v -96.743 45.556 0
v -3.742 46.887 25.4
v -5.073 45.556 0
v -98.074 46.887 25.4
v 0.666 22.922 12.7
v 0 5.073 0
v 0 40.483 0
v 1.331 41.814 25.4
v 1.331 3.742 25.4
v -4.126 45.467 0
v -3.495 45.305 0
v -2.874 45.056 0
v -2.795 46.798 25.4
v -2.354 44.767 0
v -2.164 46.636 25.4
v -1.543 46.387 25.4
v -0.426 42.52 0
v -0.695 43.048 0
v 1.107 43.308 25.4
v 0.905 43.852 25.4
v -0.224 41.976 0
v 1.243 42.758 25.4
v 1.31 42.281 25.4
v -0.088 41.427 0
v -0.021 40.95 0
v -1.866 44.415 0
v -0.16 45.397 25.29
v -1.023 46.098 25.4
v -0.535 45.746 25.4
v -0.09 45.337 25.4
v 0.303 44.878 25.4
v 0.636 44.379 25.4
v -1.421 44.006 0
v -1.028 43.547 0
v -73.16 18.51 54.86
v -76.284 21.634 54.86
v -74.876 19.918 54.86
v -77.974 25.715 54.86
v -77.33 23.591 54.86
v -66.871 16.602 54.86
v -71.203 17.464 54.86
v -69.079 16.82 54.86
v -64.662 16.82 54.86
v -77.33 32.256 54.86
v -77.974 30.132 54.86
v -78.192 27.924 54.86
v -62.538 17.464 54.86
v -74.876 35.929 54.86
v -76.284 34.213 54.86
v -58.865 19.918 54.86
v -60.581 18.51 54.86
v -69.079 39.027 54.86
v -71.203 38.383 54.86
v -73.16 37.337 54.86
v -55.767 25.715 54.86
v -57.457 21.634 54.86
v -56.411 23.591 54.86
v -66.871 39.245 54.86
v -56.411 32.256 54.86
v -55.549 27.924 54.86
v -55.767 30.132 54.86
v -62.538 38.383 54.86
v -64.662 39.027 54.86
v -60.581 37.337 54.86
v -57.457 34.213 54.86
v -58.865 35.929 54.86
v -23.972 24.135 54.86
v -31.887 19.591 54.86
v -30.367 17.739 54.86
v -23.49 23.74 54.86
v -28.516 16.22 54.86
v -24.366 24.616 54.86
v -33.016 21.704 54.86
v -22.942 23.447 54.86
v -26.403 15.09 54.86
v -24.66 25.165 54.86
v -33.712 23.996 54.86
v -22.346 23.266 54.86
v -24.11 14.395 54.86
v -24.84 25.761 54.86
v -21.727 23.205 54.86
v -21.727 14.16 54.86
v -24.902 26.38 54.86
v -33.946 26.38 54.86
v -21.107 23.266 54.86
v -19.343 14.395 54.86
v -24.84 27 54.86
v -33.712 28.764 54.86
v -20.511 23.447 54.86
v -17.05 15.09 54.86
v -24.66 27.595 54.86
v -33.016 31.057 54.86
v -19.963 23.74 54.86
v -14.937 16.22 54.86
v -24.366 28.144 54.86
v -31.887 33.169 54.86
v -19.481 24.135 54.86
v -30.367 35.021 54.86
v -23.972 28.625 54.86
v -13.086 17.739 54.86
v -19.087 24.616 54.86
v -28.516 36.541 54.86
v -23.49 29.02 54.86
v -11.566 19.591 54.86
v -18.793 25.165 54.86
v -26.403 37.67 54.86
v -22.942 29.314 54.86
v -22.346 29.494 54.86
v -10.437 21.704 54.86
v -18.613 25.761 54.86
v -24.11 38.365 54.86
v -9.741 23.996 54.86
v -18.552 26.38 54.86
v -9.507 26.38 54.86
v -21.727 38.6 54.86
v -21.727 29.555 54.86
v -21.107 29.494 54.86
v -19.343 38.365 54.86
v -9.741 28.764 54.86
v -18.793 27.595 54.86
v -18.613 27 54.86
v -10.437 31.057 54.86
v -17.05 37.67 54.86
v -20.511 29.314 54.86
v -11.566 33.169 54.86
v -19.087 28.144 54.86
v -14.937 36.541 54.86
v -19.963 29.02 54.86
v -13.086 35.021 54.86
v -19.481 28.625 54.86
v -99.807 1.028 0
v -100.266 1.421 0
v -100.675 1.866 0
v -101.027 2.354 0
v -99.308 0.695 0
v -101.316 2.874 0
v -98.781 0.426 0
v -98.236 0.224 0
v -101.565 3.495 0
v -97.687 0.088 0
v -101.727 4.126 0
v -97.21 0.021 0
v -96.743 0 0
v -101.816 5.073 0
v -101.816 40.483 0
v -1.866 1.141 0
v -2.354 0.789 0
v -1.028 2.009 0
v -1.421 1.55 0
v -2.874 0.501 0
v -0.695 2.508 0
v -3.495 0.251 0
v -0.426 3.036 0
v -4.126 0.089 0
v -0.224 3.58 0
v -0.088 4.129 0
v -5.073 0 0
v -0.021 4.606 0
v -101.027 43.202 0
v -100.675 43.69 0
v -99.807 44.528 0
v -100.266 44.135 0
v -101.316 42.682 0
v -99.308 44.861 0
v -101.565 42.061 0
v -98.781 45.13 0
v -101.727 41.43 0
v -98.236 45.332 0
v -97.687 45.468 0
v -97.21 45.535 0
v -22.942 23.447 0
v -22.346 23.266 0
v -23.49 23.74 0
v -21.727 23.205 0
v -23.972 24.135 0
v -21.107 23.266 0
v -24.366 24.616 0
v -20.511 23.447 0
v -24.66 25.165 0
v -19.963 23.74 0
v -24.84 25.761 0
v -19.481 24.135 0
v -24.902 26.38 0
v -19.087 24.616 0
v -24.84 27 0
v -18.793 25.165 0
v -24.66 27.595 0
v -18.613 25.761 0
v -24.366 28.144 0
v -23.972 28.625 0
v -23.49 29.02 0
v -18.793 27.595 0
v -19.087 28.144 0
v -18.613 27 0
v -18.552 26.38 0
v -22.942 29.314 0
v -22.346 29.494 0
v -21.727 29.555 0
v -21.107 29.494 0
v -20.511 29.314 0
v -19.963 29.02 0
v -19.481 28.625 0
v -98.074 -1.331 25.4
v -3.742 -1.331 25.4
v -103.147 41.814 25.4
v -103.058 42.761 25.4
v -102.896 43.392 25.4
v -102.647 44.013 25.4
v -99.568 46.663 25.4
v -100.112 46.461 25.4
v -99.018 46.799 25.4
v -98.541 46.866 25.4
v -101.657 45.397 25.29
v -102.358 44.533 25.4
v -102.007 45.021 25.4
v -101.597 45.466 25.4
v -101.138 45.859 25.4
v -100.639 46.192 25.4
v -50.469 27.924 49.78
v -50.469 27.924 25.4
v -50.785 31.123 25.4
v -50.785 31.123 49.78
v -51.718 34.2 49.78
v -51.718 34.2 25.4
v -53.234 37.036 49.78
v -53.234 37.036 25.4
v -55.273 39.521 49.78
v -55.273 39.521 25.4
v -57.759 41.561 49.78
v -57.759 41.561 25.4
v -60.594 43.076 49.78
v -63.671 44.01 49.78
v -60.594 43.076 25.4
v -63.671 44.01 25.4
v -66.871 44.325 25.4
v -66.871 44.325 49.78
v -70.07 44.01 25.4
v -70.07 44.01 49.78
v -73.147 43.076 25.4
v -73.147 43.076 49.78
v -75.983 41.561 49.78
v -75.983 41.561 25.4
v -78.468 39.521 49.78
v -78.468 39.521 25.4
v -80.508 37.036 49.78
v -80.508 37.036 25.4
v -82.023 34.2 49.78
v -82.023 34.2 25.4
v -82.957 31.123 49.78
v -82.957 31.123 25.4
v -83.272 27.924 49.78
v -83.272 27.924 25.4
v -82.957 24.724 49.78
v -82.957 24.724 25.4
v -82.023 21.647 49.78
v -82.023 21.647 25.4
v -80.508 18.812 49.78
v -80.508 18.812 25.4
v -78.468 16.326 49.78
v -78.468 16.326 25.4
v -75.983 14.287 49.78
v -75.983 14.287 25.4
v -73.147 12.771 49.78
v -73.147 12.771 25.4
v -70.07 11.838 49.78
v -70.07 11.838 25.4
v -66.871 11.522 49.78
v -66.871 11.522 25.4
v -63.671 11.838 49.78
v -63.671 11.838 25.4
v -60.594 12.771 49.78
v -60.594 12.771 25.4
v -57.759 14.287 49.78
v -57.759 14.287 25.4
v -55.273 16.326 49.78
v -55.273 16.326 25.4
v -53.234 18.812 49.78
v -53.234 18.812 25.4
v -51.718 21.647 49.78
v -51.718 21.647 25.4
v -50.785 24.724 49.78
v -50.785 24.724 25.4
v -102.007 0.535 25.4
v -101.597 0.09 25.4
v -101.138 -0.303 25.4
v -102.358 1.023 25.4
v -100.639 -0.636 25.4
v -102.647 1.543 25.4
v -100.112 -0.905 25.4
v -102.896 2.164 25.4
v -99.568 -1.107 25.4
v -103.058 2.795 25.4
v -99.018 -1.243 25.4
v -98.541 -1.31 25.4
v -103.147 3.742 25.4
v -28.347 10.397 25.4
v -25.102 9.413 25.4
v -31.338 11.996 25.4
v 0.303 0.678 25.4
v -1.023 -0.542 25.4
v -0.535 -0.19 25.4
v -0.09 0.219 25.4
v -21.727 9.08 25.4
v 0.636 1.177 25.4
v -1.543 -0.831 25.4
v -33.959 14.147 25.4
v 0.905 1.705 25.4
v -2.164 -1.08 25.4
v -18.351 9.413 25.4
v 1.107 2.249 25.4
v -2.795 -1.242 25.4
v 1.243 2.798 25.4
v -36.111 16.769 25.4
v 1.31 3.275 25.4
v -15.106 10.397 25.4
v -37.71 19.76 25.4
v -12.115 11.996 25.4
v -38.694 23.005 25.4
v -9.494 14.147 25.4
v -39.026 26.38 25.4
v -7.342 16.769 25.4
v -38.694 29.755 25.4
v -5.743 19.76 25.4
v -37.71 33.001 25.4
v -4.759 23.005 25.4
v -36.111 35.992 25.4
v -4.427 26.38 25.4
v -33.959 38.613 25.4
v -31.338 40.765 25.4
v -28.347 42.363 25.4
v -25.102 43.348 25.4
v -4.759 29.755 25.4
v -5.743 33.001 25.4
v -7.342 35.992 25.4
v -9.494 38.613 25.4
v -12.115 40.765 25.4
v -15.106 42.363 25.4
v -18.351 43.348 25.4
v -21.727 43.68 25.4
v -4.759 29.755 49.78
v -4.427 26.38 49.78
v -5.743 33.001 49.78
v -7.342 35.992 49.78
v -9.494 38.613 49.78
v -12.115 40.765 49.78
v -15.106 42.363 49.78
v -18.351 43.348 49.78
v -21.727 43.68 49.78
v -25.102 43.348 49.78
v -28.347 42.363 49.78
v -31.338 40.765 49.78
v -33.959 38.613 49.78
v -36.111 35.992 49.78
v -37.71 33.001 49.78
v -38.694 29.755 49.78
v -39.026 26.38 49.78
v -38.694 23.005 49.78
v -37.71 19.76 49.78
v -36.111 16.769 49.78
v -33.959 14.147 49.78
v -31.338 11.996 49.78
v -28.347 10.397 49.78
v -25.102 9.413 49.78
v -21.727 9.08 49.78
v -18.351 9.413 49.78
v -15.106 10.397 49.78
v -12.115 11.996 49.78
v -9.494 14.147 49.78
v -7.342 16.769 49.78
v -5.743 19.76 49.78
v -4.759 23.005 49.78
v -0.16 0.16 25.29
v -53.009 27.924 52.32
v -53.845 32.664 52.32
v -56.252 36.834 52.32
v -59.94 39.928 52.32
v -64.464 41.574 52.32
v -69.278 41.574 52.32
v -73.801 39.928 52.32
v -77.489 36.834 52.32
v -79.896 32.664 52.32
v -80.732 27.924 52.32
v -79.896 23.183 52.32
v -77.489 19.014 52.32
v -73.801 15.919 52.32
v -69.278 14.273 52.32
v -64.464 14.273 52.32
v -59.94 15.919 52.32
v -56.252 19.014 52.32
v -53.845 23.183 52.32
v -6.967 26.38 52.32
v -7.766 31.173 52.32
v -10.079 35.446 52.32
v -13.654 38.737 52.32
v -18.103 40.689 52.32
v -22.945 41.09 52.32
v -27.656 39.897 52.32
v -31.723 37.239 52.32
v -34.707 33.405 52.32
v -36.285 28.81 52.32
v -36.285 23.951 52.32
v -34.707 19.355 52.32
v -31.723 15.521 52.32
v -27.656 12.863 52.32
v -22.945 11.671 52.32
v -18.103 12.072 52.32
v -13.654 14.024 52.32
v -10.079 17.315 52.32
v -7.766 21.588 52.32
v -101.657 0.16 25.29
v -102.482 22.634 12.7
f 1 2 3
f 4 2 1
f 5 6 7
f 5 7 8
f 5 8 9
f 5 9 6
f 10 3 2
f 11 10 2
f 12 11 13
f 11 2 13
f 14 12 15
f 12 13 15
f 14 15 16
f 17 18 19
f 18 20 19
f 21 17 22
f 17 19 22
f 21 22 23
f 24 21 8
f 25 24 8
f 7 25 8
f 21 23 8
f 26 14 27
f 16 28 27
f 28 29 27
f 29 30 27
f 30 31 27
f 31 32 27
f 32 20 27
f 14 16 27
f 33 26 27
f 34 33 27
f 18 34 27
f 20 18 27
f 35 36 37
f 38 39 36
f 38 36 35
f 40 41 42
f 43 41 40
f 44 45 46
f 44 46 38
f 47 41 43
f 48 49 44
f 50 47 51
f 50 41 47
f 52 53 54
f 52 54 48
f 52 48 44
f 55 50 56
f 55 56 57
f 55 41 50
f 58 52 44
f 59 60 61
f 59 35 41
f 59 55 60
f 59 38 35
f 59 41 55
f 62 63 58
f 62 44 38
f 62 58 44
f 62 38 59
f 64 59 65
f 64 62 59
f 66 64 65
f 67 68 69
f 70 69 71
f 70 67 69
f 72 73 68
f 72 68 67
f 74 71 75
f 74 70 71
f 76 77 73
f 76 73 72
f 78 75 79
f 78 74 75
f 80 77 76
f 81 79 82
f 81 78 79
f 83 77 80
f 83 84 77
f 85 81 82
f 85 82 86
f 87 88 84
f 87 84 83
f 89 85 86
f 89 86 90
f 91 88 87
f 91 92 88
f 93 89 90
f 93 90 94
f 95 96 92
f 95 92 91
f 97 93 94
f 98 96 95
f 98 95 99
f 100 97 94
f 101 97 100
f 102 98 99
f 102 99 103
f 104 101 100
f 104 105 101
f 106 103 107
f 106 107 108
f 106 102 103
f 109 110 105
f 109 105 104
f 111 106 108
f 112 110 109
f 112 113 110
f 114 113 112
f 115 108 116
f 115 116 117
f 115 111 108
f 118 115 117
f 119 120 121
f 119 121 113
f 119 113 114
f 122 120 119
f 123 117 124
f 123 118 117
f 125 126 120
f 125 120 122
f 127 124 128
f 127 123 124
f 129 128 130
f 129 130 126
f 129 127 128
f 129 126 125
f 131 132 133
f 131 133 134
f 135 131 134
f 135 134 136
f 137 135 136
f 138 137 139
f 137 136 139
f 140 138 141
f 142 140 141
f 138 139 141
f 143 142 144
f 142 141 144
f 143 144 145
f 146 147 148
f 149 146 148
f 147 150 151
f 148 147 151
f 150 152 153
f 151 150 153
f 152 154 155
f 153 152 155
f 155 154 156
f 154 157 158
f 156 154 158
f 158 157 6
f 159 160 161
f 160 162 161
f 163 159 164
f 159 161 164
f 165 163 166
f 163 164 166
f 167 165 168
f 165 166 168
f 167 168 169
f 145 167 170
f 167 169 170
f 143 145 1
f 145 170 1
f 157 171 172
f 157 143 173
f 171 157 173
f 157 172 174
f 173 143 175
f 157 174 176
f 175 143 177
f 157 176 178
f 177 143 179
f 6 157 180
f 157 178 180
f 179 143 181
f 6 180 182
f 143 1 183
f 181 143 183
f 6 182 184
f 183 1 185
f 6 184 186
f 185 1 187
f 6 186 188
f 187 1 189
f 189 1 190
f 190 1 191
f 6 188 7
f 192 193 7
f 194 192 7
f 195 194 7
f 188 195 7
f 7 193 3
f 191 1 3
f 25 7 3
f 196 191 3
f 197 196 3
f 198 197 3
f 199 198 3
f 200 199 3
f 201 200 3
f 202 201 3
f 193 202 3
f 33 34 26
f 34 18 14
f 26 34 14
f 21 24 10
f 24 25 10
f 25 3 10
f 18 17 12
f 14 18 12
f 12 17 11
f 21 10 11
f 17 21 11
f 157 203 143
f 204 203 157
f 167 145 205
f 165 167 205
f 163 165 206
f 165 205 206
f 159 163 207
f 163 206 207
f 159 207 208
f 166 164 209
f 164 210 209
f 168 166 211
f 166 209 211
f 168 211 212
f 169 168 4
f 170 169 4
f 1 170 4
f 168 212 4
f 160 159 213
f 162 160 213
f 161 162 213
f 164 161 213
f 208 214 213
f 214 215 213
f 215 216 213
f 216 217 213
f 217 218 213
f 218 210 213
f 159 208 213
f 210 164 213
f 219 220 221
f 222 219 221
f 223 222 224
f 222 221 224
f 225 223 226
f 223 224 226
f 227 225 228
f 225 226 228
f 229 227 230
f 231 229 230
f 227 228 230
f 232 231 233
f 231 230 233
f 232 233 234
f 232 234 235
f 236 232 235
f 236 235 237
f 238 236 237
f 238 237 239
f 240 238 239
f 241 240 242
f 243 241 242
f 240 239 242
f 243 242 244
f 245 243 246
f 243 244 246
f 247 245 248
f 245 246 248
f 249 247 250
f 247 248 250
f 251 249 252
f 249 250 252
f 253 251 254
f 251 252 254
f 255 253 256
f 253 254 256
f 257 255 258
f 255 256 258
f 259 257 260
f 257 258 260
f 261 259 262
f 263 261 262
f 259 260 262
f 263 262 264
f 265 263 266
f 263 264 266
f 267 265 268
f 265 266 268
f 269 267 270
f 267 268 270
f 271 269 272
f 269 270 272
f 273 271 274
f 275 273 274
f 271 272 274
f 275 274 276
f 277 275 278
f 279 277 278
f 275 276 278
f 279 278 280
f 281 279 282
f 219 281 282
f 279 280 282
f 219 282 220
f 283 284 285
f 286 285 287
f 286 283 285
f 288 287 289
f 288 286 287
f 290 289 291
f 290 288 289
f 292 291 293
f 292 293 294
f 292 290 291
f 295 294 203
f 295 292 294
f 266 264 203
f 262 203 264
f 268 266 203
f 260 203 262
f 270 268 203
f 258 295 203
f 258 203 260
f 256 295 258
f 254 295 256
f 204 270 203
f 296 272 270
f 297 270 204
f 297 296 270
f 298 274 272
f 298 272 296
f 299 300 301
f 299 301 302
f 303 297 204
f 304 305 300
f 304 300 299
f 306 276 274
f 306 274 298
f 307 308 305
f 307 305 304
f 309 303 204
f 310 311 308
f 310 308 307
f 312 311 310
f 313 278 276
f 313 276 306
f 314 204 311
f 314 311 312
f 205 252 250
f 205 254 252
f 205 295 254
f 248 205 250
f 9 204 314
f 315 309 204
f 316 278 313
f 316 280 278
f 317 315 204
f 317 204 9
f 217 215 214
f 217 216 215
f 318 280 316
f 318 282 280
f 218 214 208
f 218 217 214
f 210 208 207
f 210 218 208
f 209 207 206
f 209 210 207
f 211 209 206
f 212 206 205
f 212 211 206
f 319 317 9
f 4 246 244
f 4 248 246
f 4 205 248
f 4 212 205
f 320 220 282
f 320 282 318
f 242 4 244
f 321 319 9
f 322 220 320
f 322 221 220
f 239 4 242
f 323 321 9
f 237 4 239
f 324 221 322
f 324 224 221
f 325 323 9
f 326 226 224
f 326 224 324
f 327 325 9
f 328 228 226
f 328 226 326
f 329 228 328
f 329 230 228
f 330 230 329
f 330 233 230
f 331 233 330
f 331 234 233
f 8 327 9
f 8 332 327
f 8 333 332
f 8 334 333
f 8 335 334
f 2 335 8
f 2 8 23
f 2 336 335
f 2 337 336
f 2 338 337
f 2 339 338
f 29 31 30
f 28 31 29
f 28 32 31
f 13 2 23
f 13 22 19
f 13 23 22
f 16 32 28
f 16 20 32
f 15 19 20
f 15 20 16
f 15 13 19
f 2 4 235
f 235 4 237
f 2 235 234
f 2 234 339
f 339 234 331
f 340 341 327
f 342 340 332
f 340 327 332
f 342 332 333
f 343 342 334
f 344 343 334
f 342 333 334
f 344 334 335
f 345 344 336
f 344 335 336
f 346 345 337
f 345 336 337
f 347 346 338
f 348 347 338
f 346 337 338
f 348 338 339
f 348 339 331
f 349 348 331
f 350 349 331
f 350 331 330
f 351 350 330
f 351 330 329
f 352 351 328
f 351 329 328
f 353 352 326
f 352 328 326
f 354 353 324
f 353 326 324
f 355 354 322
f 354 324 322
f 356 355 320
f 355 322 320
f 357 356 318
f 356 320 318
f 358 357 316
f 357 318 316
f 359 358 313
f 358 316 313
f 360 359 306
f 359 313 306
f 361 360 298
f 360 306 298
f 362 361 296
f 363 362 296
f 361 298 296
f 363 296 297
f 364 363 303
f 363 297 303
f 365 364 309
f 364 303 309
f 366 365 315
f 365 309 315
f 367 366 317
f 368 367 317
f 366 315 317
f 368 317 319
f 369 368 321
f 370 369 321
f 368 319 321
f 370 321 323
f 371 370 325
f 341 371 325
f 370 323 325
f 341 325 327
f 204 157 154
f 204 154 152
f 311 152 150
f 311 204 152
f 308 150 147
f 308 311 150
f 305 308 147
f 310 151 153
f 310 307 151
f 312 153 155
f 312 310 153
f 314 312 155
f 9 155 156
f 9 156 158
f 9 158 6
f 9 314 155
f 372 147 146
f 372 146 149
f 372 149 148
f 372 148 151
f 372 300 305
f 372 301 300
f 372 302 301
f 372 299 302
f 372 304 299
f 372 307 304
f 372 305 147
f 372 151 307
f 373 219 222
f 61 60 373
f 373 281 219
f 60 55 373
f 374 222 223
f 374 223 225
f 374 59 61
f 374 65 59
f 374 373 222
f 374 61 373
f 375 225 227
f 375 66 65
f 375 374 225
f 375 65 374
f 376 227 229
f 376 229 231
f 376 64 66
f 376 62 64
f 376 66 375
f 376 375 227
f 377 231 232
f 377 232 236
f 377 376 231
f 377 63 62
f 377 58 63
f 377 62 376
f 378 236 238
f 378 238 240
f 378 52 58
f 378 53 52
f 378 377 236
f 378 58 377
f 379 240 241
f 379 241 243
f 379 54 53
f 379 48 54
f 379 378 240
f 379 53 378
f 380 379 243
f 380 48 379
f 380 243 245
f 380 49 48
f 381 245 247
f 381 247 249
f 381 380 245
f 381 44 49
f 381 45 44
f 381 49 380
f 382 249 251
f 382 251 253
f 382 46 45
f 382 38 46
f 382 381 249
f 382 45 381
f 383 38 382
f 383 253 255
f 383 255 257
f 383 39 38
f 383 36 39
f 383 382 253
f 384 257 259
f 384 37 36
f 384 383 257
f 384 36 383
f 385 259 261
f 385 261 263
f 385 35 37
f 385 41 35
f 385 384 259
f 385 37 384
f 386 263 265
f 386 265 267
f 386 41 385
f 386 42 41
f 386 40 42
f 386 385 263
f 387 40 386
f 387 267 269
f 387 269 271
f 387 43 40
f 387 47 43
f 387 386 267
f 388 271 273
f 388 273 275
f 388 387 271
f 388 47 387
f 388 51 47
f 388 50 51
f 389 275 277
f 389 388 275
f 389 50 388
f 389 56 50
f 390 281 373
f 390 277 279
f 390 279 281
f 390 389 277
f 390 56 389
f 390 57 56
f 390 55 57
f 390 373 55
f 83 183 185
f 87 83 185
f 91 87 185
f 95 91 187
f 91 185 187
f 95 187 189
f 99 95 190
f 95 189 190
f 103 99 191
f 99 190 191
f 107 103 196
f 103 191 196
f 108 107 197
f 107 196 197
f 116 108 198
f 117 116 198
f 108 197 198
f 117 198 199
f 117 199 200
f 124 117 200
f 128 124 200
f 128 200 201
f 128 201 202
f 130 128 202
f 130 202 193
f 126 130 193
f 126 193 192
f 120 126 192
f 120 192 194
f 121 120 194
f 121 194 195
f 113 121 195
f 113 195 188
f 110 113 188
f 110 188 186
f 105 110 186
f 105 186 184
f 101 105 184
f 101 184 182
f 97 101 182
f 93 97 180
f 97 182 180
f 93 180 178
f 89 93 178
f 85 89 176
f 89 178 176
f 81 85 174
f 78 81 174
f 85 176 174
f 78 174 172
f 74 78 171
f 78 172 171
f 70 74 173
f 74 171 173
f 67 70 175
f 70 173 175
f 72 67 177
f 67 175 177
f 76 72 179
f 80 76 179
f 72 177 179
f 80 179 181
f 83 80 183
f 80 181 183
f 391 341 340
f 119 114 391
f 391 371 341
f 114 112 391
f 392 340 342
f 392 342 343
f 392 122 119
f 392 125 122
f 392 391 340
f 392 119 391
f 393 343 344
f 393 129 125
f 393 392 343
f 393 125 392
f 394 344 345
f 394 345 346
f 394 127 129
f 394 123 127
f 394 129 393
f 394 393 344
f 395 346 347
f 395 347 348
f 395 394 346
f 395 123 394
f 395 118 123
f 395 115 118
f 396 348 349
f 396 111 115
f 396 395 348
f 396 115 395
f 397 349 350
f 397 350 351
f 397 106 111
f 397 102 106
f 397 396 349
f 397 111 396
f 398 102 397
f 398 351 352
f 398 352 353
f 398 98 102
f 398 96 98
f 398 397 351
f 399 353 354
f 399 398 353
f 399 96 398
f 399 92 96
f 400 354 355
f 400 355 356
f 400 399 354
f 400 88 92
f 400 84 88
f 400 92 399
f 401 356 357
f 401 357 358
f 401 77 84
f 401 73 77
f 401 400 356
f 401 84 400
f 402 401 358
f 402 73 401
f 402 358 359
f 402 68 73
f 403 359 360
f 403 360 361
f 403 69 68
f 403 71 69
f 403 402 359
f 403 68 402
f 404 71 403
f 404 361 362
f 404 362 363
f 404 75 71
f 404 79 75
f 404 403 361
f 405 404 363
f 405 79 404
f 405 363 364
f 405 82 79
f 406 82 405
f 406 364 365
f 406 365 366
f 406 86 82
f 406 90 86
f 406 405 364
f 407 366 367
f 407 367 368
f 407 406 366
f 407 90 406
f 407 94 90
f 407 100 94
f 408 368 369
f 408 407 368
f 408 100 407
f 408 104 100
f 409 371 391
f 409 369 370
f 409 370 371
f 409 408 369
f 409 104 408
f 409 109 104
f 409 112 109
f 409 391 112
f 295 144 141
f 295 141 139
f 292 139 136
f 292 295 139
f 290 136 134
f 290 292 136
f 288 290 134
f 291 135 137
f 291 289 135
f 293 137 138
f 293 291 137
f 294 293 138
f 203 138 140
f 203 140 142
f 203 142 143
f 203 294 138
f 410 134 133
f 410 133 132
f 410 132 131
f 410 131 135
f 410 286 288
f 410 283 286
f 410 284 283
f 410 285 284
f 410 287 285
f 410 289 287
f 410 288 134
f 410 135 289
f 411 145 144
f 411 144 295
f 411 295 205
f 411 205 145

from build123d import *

# Parameters (mm, degrees)
F0_W     = 101.8161997199
F0_H     = 45.5561242998
F1_DEPTH = 25.4
F1_TAPER = -3
F2_R     = 16.4012411608
F2_R_2   = 17.2999496767
F3_DEPTH = 29.4599
F4_R     = 5.08
F5_SIZE  = 5.08
F7_D     = 6.35


with BuildPart() as f1:
    # F0 (on Top) → F1 (new body)
    with BuildSketch(Plane.XY):
        with Locations((-50.90809986, 22.7780621499)):
            Rectangle(F0_W, F0_H)
    extrude(amount=F1_DEPTH, taper=F1_TAPER)

    # F2 (on face) → F3 (join)
    with BuildSketch(Plane.XY.offset(25.4)):
        with Locations((-66.870637238, 27.9236733913)):
            Circle(F2_R)
        with Locations((-21.7265021056, 26.3802520931)):
            Circle(F2_R_2)
    extrude(amount=F3_DEPTH)

    # F4
    f4_edges = [f1.edges().sort_by_distance(p)[0] for p in [
        (-102.481779, -0.665579, 12.7),
        (0.665579, -0.665579, 12.7),
        (0.665579, 46.221703, 12.7),
        (-102.481779, 46.221703, 12.7),
    ]]
    fillet(f4_edges, radius=F4_R)

    # F5
    f5_edges = [f1.edges().sort_by_distance(p)[0] for p in [
        (-39.026452, 26.380252, 54.8599),
        (-83.271878, 27.923673, 54.8599),
    ]]
    chamfer(f5_edges, length=F5_SIZE)

    # F7 (through all)
    with Locations(Plane.XY.offset(54.8599)):
        with Locations((-21.7265021056, 26.3802520931)):
            Hole(F7_D / 2)


solid = f1.part
